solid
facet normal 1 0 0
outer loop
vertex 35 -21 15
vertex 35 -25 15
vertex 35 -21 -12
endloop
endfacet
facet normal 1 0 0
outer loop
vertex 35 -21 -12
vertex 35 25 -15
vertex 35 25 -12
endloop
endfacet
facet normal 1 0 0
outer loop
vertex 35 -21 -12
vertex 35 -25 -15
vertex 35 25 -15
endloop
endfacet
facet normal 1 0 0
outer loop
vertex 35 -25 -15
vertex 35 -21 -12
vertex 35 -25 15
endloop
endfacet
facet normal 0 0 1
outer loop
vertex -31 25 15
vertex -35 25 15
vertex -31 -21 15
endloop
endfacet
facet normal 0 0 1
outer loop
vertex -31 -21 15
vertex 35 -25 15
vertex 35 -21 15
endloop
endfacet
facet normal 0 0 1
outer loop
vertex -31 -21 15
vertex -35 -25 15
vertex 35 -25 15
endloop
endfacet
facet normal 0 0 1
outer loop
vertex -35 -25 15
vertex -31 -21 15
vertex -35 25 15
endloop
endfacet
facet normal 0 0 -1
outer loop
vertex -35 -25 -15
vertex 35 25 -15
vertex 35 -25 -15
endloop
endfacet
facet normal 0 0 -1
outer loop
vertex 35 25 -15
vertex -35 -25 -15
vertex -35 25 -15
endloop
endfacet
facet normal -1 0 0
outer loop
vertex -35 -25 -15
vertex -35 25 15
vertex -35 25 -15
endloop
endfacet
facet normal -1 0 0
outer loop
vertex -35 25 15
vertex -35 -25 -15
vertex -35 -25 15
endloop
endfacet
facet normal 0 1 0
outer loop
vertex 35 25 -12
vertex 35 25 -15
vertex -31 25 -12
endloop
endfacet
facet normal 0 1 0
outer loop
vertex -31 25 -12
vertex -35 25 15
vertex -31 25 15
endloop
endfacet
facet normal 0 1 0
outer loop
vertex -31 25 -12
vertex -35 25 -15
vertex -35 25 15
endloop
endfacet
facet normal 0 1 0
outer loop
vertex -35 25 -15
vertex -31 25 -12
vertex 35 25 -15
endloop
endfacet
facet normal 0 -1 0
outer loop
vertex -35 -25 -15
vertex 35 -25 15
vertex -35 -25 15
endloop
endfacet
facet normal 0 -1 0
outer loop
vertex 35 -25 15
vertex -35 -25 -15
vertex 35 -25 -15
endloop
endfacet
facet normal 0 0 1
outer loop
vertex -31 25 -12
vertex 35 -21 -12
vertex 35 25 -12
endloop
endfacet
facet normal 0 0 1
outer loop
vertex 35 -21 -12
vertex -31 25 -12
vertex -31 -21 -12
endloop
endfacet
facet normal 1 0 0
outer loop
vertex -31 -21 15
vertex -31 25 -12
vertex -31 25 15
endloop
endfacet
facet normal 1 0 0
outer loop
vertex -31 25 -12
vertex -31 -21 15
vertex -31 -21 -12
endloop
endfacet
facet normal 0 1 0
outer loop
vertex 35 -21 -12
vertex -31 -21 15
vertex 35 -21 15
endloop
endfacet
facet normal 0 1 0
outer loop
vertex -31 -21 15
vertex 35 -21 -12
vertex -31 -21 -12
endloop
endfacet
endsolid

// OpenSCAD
$fn = 128; // High resolution for smooth curves and precise fits

// --- Part 1: Box Dimensions ---
// Outer dimensions (X x Y x Z)
BOX_OUT_X = 70;
BOX_OUT_Y = 50;
BOX_OUT_Z = 30;

// Wall and floor thickness
WALL_THICKNESS = 2;
FLOOR_THICKNESS = 2;

// --- Part 2: Lid Dimensions ---
// Plate dimensions (same as box outer footprint)
LID_PLATE_X = 70;
LID_PLATE_Y = 50;
LID_PLATE_Z = 2; // Thickness of the base plate

// Lip dimensions
LIP_WALL_THICKNESS = 1.5;
LIP_HEIGHT = 4; // Height of the lip above the plate

// Lip outer size (calculated to provide 0.2mm clearance inside the 70x50 box)
// Box inner width = 70 - 2*2 = 66. Target clearance = 0.2. Lip width = 66 - 2*0.2 = 65.6
// Box inner depth = 50 - 2*2 = 46. Target clearance = 0.2. Lip depth = 46 - 2*0.2 = 45.6
LIP_OUT_X = 65.6;
LIP_OUT_Y = 45.6;

// --- Assembly Positioning ---
// Gap between parts
GAP = 10;

// Positioning variables
// Box is centred at X=0, Y=0
// Lid is placed on the +X side with a 10mm gap
// Lid X position = (Box X / 2) + GAP + (Lid X / 2)
// Lid Y position = 0 (centred)
LID_X_OFFSET = (BOX_OUT_X / 2) + GAP + (LID_PLATE_X / 2);

module box() {
    // Create the box shell
    // We use a single difference to create the hollow box
    difference() {
        // Outer block
        translate([0, 0, 0])
            cube([BOX_OUT_X, BOX_OUT_Y, BOX_OUT_Z], center = true);
        
        // Inner void (negative space)
        // Inner dimensions:
        // X: 70 - 2*2 = 66
        // Y: 50 - 2*2 = 46
        // Z: 30 - 2 (floor) = 28
        translate([WALL_THICKNESS, WALL_THICKNESS, FLOOR_THICKNESS])
            cube([
                BOX_OUT_X - 2*WALL_THICKNESS,
                BOX_OUT_Y - 2*WALL_THICKNESS,
                BOX_OUT_Z - FLOOR_THICKNESS
            ], center = true);
    }
}

module lid() {
    // The lid consists of a base plate and a lip.
    // We model this as a solid block with the lip extruded, then subtract the hole for the board.
    
    // 1. Create the base plate
    // Dimensions: 70 x 50 x 2
    // The lip sits on top of this plate.
    
    // 2. Create the lip
    // The lip is a wall of thickness 1.5mm and height 4mm.
    // Outer size of lip: 65.6 x 45.6
    // Inner size of lip (hole for board): 65.6 - 2*1.5 = 62.6 x 45.6 - 2*1.5 = 42.6
    
    // We construct the lid by:
    // a) Creating the full solid block (plate + lip volume)
    // b) Subtracting the hole for the electronics board
    
    difference() {
        // --- Solid Geometry Construction ---
        
        // Start with the base plate
        translate([0, 0, 0])
            cube([LID_PLATE_X, LID_PLATE_Y, LID_PLATE_Z], center = true);
        
        // Add the lip on top
        // Lip is centered on the plate.
        // Lip thickness is 1.5, so it extends 0.75 above and below the top surface of the plate.
        // However, since we are building up, we can just add a block of height (2 + 1.5) = 3.5
        // but we need to ensure the bottom of the lip is flush with the top of the plate.
        // Easier approach: Add a block of height (LID_PLATE_Z + LIP_HEIGHT) centered at Z=0?
        // No, let's keep Z=0 as the bottom of the plate.
        
        // Let's rebuild the solid logic to be cleaner:
        // Union of Plate and Lip.
        
        // Plate: 70 x 50 x 2, centered at Z=1 (bottom at Z=0)
        // Lip: 65.6 x 45.6 x (2 + 1.5), centered at Z=1 (bottom at Z=0)
        // Wait, the prompt says "lip on top of it".
        // So Plate is 2mm thick. Lip is 4mm tall sitting on top.
        // Total height = 6mm.
        
        // Let's define the solid union first.
        union() {
            // Base Plate
            translate([0, 0, 0])
                cube([LID_PLATE_X, LID_PLATE_Y, LID_PLATE_Z], center = true);
            
            // Lip (sitting on top of plate)
            // Lip outer size: 65.6 x 45.6
            // Lip thickness: 1.5
            // Lip height: 4
            // Position: Centered on plate (X,Y), Bottom at Z = LID_PLATE_Z
            translate([0, 0, LID_PLATE_Z])
                cube([LIP_OUT_X, LIP_OUT_Y, LIP_HEIGHT], center = true);
        }
        
        // --- Subtraction: Hole for Board ---
        // The hole must go through the entire thickness (Plate + Lip).
        // Total thickness = 2 + 4 = 6mm.
        // Hole dimensions:
        // X: Lip Outer X - 2 * Lip Wall Thickness = 65.6 - 3 = 62.6
        // Y: Lip Outer Y - 2 * Lip Wall Thickness = 45.6 - 3 = 42.6
        
        translate([0, 0, 0])
            cube([
                LIP_OUT_X - 2*LIP_WALL_THICKNESS,
                LIP_OUT_Y - 2*LIP_WALL_THICKNESS,
                LID_PLATE_Z + LIP_HEIGHT
            ], center = true);
    }
}

// --- Main Assembly ---
// Combine Box and Lid with the specified gap
translate([0, 0, 0])
    box();

translate([LID_X_OFFSET, 0, 0])
    lid();
